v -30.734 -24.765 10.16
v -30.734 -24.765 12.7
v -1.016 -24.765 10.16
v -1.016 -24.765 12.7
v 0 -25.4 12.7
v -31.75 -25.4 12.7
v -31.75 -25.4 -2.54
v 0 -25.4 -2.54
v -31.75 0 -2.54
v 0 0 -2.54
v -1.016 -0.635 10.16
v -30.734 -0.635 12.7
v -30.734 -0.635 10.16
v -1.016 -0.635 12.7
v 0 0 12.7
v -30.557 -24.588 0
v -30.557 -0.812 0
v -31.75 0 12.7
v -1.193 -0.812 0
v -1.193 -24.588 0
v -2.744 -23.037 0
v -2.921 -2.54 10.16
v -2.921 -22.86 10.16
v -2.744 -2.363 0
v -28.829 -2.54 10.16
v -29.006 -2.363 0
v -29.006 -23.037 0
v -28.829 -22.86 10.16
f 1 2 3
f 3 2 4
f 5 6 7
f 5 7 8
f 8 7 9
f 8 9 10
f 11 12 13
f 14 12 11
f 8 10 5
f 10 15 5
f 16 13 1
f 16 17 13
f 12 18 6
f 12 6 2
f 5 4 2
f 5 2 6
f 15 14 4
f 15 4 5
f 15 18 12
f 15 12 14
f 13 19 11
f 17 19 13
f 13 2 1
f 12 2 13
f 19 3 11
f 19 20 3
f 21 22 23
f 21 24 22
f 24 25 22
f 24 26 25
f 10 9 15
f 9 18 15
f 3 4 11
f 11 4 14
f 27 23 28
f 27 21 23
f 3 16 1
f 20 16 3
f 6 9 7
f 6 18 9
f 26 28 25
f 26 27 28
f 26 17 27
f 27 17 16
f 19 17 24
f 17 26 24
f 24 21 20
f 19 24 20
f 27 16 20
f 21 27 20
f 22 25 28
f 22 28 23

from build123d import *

# Parameters (mm, degrees)
F0_W     = 31.75
F0_H     = 25.4
F1_DEPTH = 12.7
F2_W     = 29.718
F2_H     = 24.13
F3_DEPTH = 2.54
F4_W     = 29.718
F4_H     = 24.13
F4_W_2   = 25.908
F4_H_2   = 20.32
F5_DEPTH = 10.16
F5_TAPER = 1
F6_W     = 31.75
F6_H     = 25.4
F7_DEPTH = 2.54


with BuildPart() as f1:
    # F0 (on Top) → F1 (new body)
    with BuildSketch(Plane.XY):
        with Locations((-15.875, -12.7)):
            Rectangle(F0_W, F0_H)
    extrude(amount=F1_DEPTH)

    # F2 (on face) → F3 (cut)
    with BuildSketch(Plane.XY.offset(12.7)):
        with Locations((-15.875, -12.7)):
            Rectangle(F2_W, F2_H)
    extrude(amount=-F3_DEPTH, mode=Mode.SUBTRACT)

    # F4 (on face) → F5 (cut)
    with BuildSketch(Plane.XY.offset(10.16)):
        with Locations((-15.875, -12.7)):
            Rectangle(F4_W, F4_H)
        with Locations((-15.875, -12.7)):
            Rectangle(F4_W_2, F4_H_2, mode=Mode.SUBTRACT)
    extrude(amount=-F5_DEPTH, taper=F5_TAPER, mode=Mode.SUBTRACT)

    # F6 (on face) → F7 (join)
    with BuildSketch(Plane(origin=(0, 0, 0), x_dir=(1, 0, 0), z_dir=(0, 0, -1))):
        with Locations((-15.875, 12.7)):
            Rectangle(F6_W, F6_H)
    extrude(amount=F7_DEPTH)


solid = f1.part
